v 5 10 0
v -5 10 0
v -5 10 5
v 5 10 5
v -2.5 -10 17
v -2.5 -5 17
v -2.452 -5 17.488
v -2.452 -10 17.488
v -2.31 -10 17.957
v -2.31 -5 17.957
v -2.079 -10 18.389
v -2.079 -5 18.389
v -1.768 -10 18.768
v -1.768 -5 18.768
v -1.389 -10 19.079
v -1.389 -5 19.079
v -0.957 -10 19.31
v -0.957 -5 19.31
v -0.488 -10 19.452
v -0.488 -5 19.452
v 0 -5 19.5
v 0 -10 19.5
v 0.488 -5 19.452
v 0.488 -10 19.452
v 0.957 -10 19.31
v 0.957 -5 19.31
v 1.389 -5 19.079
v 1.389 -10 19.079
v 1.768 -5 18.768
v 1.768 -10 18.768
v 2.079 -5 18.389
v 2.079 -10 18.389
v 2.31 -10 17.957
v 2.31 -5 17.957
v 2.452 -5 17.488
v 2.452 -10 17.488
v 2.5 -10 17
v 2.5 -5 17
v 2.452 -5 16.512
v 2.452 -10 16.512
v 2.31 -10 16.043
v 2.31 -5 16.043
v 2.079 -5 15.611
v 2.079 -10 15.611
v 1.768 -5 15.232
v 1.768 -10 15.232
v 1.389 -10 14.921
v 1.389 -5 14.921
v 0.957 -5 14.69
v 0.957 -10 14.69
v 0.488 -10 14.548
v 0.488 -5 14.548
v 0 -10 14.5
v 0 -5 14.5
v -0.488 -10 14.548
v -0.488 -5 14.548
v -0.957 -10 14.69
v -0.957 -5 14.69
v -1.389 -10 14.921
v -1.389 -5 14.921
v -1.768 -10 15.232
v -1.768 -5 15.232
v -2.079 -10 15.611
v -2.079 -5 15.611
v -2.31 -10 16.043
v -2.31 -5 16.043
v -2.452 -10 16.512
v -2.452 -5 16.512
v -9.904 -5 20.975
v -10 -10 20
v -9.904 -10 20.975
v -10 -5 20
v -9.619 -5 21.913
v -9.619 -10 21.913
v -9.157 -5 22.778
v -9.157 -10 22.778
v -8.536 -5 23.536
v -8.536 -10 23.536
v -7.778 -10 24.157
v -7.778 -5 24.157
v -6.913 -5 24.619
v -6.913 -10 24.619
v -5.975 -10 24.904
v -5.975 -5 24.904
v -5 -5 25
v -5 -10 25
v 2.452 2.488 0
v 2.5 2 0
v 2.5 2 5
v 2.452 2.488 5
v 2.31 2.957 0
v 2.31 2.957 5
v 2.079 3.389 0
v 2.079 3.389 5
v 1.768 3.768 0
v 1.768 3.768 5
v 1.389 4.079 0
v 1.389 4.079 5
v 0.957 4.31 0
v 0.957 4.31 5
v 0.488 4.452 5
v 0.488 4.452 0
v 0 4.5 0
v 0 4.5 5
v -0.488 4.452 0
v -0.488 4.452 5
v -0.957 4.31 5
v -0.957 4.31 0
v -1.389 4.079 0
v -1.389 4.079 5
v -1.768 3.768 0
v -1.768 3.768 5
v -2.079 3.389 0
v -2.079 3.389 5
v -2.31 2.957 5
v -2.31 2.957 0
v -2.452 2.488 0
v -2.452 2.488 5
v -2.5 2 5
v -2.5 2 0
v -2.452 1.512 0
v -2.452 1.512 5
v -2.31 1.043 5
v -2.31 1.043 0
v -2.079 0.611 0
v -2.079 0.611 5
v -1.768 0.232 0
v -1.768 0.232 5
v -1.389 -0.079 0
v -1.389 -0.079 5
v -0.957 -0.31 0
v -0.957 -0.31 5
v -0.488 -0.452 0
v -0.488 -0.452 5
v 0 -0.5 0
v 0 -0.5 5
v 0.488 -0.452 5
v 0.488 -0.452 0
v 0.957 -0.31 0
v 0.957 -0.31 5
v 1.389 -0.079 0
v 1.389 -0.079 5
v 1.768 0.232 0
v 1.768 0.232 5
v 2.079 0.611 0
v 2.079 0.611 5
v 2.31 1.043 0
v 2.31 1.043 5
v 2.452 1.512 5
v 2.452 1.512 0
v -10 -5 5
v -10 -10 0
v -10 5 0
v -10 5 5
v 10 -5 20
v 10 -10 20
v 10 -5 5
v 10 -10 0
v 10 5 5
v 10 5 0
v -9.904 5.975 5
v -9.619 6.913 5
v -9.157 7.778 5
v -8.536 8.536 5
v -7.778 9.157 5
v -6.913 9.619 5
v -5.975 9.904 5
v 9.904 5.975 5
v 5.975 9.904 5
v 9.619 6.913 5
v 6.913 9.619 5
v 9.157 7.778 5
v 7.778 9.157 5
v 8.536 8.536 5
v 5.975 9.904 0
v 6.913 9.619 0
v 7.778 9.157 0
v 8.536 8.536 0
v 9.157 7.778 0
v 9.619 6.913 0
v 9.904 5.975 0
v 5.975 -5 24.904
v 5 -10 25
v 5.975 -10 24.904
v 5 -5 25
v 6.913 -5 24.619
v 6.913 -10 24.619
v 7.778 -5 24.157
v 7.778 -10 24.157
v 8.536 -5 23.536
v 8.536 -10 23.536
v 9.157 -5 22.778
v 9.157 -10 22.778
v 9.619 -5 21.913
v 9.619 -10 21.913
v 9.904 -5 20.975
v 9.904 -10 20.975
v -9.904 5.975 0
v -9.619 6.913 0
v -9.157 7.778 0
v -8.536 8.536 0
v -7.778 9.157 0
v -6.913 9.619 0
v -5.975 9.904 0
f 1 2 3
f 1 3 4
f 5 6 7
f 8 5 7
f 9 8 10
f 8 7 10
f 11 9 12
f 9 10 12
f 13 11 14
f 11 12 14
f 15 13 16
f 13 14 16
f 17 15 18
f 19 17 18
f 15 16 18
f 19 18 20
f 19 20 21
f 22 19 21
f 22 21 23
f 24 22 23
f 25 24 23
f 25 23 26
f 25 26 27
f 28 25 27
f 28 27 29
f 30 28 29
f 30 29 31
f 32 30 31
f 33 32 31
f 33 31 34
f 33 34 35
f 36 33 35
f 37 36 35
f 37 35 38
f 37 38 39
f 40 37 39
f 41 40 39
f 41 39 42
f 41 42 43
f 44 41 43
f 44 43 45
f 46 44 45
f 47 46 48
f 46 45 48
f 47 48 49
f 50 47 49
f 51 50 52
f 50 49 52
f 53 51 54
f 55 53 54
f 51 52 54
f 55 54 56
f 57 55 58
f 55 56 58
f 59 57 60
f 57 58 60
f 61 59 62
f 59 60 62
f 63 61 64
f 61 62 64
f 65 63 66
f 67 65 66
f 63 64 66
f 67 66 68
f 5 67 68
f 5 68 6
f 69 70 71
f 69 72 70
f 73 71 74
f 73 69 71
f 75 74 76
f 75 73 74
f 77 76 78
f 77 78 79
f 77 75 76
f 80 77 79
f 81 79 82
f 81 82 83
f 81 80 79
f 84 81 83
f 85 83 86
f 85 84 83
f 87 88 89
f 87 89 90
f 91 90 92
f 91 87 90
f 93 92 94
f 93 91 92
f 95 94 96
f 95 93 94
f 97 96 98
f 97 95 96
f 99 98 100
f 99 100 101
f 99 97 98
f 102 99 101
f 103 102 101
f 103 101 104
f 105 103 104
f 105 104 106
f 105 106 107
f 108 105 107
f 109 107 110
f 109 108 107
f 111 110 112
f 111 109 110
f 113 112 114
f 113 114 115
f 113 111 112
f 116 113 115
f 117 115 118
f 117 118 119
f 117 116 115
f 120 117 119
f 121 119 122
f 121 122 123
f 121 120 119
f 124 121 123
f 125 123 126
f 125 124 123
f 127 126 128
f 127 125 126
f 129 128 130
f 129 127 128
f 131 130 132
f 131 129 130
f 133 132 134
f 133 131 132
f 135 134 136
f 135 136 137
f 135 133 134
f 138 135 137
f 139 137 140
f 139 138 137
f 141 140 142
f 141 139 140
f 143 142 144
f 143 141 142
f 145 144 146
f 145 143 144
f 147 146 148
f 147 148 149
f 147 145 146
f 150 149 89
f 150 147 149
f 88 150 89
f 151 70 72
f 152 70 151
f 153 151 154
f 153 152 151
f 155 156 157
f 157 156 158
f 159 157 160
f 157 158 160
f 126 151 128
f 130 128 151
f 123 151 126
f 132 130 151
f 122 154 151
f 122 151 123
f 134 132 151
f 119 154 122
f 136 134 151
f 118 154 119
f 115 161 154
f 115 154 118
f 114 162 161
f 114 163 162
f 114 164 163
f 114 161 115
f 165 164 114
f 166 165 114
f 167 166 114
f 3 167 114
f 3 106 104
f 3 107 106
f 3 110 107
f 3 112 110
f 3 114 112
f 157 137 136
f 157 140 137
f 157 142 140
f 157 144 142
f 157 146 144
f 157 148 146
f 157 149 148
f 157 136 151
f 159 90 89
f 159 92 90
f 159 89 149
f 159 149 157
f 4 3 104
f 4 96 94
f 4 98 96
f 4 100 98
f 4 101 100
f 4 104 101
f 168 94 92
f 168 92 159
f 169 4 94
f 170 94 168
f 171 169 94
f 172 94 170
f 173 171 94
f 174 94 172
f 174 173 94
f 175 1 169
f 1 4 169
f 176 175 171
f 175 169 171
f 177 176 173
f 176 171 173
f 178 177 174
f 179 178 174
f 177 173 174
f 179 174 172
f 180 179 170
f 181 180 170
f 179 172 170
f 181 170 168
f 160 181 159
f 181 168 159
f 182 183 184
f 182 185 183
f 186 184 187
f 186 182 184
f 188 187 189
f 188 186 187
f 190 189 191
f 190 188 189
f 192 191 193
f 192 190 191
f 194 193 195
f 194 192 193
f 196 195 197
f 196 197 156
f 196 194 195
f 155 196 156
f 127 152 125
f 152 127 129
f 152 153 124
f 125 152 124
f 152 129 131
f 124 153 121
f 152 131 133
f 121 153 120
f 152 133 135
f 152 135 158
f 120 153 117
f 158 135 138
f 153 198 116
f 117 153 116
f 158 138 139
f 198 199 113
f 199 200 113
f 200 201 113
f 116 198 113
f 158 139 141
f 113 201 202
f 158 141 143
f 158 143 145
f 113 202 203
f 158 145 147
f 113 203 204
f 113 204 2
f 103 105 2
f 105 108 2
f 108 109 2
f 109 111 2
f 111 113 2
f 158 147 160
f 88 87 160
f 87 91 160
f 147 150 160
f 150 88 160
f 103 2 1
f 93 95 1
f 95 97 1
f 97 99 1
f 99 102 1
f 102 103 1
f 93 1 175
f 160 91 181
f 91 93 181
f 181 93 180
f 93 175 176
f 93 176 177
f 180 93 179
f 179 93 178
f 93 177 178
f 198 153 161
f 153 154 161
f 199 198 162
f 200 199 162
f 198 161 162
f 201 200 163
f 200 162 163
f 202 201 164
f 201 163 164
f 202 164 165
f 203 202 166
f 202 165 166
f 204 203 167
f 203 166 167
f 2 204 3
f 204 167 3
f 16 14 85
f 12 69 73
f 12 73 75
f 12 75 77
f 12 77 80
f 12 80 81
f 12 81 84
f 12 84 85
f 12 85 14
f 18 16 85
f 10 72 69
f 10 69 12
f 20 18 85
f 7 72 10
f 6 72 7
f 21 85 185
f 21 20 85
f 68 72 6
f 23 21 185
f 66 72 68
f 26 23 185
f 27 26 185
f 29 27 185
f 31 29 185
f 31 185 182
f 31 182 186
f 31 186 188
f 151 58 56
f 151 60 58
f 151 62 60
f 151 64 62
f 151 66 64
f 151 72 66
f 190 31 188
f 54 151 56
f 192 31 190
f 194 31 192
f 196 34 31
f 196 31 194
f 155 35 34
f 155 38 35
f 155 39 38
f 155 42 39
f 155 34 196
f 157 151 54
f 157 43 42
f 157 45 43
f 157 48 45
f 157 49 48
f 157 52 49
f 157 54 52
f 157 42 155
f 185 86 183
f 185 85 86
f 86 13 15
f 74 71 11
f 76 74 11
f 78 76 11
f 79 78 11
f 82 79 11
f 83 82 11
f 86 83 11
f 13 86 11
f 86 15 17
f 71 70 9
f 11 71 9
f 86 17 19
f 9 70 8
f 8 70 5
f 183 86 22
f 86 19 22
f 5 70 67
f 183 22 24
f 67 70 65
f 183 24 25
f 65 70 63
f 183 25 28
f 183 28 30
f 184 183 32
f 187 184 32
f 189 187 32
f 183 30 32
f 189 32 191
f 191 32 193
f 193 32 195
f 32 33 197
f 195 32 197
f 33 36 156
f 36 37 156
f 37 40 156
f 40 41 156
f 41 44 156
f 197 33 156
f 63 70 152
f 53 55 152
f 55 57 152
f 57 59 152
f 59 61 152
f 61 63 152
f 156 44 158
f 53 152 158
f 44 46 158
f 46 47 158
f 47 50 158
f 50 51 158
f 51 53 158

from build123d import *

# Parameters (mm, degrees)
F0_W     = 20
F0_H     = 20
F0_R     = 2.5
F1_DEPTH = 5
F2_W     = 20
F2_H     = 5
F3_DEPTH = 20
F4_R     = 2.5
F5_DEPTH = 5.001
F6_R     = 5


with BuildPart() as f1:
    # F0 (on Top) → F1 (new body)
    with BuildSketch(Plane.XY):
        Rectangle(F0_W, F0_H)
        with Locations((0, 2)):
            Circle(F0_R, mode=Mode.SUBTRACT)
    extrude(amount=F1_DEPTH)

    # F2 (on face) → F3 (join)
    with BuildSketch(Plane.XY.offset(5)):
        with Locations((0, -7.5)):
            Rectangle(F2_W, F2_H)
    extrude(amount=F3_DEPTH)

    # F4 (on face) → F5 (cut, through all)
    with BuildSketch(Plane(origin=(0, -5, 0), x_dir=(-1, 0, 0), z_dir=(0, 1, 0))):
        with Locations((0, 17)):
            Circle(F4_R)
    extrude(amount=-F5_DEPTH, mode=Mode.SUBTRACT)

    # F6
    f6_edges = [f1.edges().sort_by_distance(p)[0] for p in [
        (-10, -7.5, 25),
        (10, -7.5, 25),
        (10, 10, 2.5),
        (-10, 10, 2.5),
    ]]
    fillet(f6_edges, radius=F6_R)


solid = f1.part
